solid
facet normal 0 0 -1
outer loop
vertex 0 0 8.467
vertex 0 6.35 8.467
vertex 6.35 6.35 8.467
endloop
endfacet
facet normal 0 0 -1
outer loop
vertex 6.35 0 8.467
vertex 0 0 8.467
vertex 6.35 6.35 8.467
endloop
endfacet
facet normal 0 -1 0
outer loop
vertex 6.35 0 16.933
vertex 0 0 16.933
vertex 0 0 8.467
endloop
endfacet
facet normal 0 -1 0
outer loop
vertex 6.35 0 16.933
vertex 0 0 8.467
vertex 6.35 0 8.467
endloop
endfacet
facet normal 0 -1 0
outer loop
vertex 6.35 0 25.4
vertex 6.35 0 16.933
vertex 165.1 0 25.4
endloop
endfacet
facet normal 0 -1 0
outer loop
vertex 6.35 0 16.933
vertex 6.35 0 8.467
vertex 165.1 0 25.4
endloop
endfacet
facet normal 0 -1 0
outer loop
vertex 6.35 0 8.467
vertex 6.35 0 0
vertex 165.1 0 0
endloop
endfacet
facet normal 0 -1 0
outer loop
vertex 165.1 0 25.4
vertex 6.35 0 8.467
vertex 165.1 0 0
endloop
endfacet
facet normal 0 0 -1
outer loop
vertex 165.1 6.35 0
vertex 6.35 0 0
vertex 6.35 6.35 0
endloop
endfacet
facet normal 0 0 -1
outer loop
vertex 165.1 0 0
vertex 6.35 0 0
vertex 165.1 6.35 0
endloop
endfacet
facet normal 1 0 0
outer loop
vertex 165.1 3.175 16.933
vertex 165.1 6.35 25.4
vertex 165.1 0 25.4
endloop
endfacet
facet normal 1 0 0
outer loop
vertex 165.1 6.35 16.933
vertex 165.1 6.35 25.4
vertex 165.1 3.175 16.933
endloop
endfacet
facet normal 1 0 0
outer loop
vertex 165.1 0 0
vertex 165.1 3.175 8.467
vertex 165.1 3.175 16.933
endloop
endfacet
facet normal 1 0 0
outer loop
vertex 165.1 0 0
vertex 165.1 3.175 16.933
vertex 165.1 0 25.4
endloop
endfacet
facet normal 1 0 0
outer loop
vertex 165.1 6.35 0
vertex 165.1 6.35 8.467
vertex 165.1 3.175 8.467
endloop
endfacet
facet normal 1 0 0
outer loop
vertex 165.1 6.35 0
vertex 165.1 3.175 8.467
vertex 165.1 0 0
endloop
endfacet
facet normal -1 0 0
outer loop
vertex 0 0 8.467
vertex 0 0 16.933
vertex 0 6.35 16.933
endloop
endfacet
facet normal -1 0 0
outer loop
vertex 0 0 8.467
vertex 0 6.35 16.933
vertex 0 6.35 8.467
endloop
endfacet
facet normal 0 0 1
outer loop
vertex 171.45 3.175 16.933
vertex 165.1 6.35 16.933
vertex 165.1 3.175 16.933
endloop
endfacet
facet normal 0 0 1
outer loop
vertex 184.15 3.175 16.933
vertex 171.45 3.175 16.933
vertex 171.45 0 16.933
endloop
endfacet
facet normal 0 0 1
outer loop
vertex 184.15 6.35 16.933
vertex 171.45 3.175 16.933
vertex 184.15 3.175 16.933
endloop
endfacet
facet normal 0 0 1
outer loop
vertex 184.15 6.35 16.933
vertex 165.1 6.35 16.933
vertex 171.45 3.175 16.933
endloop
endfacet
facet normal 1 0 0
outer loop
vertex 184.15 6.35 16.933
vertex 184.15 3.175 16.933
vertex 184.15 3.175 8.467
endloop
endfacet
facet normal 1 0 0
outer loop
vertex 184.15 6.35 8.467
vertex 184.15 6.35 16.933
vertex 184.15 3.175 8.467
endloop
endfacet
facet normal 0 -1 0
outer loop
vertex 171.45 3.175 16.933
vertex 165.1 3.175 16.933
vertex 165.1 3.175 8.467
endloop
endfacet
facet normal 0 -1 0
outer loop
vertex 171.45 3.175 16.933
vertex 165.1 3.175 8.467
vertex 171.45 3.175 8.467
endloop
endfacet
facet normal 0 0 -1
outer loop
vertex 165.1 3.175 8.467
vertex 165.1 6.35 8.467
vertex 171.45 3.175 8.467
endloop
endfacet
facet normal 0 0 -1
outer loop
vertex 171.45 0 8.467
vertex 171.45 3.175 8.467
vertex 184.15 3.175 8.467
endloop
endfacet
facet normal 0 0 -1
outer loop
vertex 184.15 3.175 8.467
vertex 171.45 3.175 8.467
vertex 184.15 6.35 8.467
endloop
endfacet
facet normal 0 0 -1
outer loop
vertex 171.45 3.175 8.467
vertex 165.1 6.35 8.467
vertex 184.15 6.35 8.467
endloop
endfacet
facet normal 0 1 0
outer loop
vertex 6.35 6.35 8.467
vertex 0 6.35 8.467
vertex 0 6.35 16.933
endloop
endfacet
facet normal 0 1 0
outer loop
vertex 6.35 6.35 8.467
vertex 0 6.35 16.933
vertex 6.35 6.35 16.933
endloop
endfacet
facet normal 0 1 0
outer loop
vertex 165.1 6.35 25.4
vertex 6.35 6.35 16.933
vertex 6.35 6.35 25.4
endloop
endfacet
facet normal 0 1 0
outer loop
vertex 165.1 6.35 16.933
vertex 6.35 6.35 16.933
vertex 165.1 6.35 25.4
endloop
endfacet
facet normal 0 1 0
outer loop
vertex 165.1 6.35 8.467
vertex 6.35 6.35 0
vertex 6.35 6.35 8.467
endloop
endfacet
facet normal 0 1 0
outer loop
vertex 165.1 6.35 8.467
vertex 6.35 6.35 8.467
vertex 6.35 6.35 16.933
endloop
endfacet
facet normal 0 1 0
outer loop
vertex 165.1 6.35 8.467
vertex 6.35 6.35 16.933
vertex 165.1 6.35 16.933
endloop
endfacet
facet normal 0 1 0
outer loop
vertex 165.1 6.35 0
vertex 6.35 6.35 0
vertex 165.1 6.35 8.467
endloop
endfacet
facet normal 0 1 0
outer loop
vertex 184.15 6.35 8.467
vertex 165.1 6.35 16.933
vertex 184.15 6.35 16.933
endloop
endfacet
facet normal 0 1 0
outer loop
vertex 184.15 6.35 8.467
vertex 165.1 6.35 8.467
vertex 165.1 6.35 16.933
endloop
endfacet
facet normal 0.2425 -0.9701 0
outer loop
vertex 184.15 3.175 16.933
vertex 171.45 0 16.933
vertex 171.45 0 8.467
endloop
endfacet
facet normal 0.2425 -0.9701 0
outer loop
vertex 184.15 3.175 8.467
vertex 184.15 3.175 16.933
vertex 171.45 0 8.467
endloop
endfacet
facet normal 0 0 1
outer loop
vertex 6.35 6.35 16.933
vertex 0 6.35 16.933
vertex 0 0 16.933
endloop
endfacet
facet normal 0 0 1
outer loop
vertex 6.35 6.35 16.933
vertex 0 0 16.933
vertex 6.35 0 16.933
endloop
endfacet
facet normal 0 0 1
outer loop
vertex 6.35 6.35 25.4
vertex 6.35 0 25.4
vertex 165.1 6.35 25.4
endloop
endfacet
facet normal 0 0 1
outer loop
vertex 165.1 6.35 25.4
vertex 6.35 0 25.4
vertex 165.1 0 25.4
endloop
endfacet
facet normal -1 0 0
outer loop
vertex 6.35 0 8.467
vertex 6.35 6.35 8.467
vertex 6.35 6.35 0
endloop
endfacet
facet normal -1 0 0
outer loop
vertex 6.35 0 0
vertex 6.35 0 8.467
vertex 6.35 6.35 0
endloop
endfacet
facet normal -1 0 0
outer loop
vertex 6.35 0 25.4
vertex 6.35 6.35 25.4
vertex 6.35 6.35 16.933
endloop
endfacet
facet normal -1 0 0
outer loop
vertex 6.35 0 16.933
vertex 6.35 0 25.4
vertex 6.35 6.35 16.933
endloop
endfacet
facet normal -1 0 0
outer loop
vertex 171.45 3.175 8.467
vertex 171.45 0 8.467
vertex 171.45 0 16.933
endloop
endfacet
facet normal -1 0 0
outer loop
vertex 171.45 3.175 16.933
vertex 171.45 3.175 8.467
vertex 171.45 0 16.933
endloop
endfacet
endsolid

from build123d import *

# Parameters (mm, degrees)
SKETCH1_W           = 184.15
SKETCH1_H           = 25.4
BOSS_EXTRUDE1_DEPTH = 6.35
SKETCH4_W           = 6.35
SKETCH4_H           = 8.466666667
CUT_EXTRUDE1_DEPTH  = 187.001895152
SKETCH5_W           = 19.05
SKETCH5_H           = 8.466666667
CUT_EXTRUDE2_DEPTH  = 6.35
SKETCH6_W           = 6.35
SKETCH6_H           = 8.466666666
CUT_EXTRUDE3_DEPTH  = 3.175
CHAMFER3_SIZE2      = 3.175
CHAMFER3_SIZE       = 12.7


with BuildPart() as part:
    # Sketch1 → Boss-Extrude1 (new body)
    with BuildSketch(Plane(origin=(0, 0, 0), x_dir=(1, 0, 0), z_dir=(0, 1, 0))):
        with Locations((92.075, -12.7)):
            Rectangle(SKETCH1_W, SKETCH1_H)
    extrude(amount=BOSS_EXTRUDE1_DEPTH)

    # Sketch4 → Cut-Extrude1 (cut, through all)
    with BuildSketch(Plane(origin=(0, 6.35, 0), x_dir=(1, 0, 0), z_dir=(0, 1, 0))):
        with Locations((3.175, -4.233333334)):
            Rectangle(SKETCH4_W, SKETCH4_H)
        with Locations((3.175, -21.166666666)):
            Rectangle(SKETCH4_W, SKETCH4_H)
    extrude(amount=-CUT_EXTRUDE1_DEPTH, mode=Mode.SUBTRACT)

    # Sketch5 → Cut-Extrude2 (cut)
    with BuildSketch(Plane(origin=(0, 6.35, 0), x_dir=(1, 0, 0), z_dir=(0, 1, 0))):
        with Locations((174.625, -21.166666666)):
            Rectangle(SKETCH5_W, SKETCH5_H)
        with Locations((174.625, -4.233333334)):
            Rectangle(SKETCH5_W, SKETCH5_H)
    extrude(amount=-CUT_EXTRUDE2_DEPTH, mode=Mode.SUBTRACT)

    # Sketch6 → Cut-Extrude3 (cut)
    with BuildSketch(Plane.XZ):
        with Locations((168.275, 12.7)):
            Rectangle(SKETCH6_W, SKETCH6_H)
    extrude(amount=-CUT_EXTRUDE3_DEPTH, mode=Mode.SUBTRACT)

    # Chamfer3
    chamfer3_edges = [part.edges().sort_by_distance(p)[0] for p in [
        (184.15, 0, 12.7),
    ]]
    chamfer3_side = [part.faces().sort_by_distance(p)[0] for p in [
        (184.0865, 0, 12.7),
    ]]
    chamfer(chamfer3_edges, length=CHAMFER3_SIZE - 0.0001, length2=CHAMFER3_SIZE2 - 0.0001, reference=chamfer3_side[0])  # a hair under: the kernel refuses the full size


solid = part.part
